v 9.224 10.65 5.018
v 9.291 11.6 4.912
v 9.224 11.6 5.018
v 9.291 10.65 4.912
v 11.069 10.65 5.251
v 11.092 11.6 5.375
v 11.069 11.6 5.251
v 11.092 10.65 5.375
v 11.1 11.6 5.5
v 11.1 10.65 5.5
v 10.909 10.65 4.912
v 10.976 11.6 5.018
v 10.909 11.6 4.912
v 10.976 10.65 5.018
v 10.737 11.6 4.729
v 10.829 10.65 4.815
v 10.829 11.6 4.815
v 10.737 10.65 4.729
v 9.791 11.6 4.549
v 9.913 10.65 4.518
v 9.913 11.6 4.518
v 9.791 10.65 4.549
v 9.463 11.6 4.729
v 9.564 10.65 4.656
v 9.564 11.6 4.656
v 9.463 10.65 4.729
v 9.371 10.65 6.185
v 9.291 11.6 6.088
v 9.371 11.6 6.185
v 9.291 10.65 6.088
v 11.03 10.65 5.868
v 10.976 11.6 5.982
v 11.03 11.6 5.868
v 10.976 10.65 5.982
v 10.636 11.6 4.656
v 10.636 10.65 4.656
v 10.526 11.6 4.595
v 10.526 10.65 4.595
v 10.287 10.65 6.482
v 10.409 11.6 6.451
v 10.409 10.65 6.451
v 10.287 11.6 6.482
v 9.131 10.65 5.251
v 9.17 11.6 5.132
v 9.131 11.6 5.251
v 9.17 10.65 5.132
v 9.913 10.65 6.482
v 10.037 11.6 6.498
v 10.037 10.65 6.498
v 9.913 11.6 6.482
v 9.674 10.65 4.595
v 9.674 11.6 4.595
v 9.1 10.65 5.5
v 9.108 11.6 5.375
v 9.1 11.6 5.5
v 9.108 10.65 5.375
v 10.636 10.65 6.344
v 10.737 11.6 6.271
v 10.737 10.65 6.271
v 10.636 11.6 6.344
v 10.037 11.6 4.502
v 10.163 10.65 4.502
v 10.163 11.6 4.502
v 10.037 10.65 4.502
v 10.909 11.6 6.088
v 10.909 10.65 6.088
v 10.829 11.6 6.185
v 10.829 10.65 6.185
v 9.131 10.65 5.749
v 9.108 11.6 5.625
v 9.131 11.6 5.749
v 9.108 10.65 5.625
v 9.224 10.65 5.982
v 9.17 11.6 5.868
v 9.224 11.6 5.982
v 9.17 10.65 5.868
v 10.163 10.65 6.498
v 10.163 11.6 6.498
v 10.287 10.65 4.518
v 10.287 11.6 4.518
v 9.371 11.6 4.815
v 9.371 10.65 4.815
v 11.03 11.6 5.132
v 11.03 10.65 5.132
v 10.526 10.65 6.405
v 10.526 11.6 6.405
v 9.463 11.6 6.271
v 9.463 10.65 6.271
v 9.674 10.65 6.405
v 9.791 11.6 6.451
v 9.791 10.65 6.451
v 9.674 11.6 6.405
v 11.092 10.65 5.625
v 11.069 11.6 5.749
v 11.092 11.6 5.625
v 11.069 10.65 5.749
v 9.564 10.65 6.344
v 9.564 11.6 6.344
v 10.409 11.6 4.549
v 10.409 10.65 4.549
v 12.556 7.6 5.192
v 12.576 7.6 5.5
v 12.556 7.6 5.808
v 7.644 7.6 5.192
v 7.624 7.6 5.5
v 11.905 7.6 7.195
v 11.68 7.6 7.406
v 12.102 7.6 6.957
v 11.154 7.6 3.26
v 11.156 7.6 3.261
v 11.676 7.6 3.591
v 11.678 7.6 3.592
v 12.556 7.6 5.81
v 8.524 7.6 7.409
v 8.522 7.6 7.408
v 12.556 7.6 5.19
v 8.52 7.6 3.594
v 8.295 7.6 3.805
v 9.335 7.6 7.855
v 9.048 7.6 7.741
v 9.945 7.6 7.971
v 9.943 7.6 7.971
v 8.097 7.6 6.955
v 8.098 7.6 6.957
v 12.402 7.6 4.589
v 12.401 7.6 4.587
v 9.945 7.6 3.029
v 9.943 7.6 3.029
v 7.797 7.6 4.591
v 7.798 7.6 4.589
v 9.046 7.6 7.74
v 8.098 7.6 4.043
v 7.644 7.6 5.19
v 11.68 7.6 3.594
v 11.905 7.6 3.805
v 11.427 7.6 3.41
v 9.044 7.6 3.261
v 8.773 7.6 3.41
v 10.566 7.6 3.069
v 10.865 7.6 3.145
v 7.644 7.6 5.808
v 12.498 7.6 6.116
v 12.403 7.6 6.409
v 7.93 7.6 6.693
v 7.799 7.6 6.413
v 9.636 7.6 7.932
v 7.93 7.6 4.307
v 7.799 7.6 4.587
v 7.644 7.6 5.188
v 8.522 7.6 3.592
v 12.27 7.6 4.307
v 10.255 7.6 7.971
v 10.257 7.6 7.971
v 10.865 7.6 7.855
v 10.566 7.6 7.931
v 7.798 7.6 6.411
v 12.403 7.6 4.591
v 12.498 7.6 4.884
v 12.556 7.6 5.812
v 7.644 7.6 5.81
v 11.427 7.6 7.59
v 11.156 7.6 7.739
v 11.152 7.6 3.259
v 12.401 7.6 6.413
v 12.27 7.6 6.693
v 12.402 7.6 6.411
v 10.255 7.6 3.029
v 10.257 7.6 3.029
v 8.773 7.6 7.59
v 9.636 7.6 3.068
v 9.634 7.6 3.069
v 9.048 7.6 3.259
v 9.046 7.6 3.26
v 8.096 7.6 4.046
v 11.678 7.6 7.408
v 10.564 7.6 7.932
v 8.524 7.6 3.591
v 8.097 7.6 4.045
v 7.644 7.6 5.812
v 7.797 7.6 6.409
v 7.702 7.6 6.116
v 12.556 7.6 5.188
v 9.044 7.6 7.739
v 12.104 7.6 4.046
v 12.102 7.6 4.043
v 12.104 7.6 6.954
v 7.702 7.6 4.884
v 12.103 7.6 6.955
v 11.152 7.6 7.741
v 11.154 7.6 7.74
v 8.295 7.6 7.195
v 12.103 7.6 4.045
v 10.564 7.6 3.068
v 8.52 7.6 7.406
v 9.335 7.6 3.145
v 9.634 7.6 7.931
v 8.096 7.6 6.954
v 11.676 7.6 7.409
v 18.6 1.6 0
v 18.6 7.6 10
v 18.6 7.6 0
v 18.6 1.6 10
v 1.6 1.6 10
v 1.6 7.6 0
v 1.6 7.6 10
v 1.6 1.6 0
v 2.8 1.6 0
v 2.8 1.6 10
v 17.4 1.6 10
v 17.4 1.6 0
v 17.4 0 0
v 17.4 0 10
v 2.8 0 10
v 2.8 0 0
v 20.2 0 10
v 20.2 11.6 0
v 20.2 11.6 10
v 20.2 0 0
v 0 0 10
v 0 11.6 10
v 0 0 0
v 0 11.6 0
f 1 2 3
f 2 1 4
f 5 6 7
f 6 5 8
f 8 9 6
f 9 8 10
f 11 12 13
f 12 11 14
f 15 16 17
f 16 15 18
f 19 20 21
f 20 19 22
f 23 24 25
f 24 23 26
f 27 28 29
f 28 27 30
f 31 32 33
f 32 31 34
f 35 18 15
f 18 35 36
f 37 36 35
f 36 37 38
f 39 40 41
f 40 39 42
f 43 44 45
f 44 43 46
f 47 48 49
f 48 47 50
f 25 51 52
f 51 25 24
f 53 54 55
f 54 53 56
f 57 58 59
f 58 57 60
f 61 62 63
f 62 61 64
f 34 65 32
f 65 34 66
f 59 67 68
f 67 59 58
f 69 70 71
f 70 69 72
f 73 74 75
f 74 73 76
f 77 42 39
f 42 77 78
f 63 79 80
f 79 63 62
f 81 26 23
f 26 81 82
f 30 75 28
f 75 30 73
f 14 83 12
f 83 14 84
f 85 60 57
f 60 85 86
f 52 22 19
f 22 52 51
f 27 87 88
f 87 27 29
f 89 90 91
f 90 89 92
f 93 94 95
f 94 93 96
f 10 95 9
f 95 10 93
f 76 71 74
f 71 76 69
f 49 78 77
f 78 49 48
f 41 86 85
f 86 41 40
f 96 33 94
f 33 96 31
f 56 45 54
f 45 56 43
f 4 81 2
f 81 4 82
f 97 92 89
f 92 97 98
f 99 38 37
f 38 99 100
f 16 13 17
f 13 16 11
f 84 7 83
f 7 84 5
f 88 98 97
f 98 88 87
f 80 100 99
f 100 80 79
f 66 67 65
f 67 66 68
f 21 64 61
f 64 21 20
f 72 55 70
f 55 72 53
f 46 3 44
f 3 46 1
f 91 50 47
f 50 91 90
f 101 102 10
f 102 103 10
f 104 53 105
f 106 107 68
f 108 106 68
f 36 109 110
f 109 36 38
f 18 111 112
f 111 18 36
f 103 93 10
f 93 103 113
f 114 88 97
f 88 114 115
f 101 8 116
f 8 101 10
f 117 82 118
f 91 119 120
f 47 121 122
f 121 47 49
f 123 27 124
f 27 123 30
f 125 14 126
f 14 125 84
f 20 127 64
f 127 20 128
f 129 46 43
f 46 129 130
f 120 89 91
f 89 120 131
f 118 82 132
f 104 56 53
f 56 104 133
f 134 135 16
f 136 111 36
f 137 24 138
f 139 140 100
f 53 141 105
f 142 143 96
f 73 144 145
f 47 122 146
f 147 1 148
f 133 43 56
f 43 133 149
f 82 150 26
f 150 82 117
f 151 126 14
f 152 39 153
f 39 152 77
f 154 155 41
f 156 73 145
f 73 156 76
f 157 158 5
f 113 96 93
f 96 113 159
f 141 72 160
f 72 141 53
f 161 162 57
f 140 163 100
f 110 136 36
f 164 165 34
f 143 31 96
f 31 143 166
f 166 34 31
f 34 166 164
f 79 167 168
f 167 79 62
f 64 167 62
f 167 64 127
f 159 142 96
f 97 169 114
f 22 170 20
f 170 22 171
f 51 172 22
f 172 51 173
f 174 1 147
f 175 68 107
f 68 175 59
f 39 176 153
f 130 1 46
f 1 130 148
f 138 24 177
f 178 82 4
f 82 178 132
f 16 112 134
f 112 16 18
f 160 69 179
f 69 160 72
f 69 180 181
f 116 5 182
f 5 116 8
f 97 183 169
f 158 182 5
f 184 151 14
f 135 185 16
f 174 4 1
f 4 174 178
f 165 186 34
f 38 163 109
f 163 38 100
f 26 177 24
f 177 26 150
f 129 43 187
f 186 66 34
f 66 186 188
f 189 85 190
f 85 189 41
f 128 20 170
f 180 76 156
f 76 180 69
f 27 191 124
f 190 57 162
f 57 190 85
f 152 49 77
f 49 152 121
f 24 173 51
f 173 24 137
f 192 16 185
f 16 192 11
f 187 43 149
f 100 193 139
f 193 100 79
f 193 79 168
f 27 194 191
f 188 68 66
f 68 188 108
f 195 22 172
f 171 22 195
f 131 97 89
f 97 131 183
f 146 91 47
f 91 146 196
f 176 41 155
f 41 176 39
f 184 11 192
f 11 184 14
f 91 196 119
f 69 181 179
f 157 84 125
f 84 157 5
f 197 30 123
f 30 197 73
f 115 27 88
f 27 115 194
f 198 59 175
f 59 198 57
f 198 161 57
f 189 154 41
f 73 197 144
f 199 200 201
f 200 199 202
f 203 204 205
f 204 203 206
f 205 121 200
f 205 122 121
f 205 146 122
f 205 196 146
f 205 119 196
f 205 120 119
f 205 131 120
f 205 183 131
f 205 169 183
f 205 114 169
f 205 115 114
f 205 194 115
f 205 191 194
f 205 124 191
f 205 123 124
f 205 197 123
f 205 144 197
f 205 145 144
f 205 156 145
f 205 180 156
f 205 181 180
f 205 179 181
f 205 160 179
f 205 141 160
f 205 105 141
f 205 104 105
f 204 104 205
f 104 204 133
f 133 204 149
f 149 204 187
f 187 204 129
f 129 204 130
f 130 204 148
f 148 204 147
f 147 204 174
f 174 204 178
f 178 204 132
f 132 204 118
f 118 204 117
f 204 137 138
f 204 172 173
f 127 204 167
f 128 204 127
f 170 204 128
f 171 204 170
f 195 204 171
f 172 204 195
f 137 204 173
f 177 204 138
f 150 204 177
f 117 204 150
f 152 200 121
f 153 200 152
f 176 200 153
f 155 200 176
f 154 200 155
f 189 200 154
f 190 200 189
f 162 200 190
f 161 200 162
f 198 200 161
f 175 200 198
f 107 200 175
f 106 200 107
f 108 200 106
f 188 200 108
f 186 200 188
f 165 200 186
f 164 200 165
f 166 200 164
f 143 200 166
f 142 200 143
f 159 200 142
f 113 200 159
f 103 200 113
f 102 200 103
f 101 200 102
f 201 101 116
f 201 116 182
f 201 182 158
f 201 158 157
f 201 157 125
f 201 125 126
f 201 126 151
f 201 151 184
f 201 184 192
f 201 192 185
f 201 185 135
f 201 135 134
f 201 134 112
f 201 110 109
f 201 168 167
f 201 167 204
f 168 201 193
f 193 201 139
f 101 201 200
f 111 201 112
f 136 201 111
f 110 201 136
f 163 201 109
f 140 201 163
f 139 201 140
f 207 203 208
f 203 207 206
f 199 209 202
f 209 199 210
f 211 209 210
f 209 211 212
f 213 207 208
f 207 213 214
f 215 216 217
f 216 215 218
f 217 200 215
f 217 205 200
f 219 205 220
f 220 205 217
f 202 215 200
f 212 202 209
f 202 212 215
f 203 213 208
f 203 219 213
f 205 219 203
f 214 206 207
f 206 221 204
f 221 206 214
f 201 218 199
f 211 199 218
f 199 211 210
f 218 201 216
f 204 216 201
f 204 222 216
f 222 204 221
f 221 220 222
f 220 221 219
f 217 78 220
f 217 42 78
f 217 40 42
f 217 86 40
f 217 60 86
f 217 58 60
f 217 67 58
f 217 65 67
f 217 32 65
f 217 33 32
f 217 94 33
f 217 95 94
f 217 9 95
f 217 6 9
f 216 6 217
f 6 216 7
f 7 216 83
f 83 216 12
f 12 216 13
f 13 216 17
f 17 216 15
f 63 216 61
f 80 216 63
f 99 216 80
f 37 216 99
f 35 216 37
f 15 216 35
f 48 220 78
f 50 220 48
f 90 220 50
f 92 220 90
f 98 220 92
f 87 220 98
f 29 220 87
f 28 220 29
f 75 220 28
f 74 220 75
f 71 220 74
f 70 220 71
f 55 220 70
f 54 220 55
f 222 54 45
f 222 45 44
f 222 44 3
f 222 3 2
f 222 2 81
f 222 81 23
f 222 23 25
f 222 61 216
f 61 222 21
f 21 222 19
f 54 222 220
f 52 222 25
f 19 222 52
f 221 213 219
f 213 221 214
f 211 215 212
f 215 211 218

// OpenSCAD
innerWidth      = 17;
innerHeight     = 6;
length          = 10;
shellThickness     = 1.6;
shellBackingThickness= 4;
grippingLedgeSize      = 1.2;
screwDiameter    = 2;
screwHeadDiameter = 5;
screwHeadHeight= 3;

difference(){
    cube([innerWidth+shellThickness*2,innerHeight+shellThickness+shellBackingThickness,length]);
    union(){
        translate([shellThickness,shellThickness,-0.05]){
            cube([innerWidth,innerHeight,length+0.5]);
        }
        translate([shellThickness+grippingLedgeSize,-0.05,-0.05]){
            cube([innerWidth-grippingLedgeSize*2,shellThickness+0.1,length+0.5]);
        }
        translate([shellThickness+innerWidth/2,shellThickness+innerHeight-0.05,length/2+0.5]){
            rotate([270,0,0]){
                cylinder(r=screwDiameter/2,h=shellBackingThickness+0.1, $fn=50);
                cylinder(r1=screwHeadDiameter/2,r2=screwDiameter/2,h=screwHeadHeight+0.1, $fn=50);
            }
        }
    }
}
